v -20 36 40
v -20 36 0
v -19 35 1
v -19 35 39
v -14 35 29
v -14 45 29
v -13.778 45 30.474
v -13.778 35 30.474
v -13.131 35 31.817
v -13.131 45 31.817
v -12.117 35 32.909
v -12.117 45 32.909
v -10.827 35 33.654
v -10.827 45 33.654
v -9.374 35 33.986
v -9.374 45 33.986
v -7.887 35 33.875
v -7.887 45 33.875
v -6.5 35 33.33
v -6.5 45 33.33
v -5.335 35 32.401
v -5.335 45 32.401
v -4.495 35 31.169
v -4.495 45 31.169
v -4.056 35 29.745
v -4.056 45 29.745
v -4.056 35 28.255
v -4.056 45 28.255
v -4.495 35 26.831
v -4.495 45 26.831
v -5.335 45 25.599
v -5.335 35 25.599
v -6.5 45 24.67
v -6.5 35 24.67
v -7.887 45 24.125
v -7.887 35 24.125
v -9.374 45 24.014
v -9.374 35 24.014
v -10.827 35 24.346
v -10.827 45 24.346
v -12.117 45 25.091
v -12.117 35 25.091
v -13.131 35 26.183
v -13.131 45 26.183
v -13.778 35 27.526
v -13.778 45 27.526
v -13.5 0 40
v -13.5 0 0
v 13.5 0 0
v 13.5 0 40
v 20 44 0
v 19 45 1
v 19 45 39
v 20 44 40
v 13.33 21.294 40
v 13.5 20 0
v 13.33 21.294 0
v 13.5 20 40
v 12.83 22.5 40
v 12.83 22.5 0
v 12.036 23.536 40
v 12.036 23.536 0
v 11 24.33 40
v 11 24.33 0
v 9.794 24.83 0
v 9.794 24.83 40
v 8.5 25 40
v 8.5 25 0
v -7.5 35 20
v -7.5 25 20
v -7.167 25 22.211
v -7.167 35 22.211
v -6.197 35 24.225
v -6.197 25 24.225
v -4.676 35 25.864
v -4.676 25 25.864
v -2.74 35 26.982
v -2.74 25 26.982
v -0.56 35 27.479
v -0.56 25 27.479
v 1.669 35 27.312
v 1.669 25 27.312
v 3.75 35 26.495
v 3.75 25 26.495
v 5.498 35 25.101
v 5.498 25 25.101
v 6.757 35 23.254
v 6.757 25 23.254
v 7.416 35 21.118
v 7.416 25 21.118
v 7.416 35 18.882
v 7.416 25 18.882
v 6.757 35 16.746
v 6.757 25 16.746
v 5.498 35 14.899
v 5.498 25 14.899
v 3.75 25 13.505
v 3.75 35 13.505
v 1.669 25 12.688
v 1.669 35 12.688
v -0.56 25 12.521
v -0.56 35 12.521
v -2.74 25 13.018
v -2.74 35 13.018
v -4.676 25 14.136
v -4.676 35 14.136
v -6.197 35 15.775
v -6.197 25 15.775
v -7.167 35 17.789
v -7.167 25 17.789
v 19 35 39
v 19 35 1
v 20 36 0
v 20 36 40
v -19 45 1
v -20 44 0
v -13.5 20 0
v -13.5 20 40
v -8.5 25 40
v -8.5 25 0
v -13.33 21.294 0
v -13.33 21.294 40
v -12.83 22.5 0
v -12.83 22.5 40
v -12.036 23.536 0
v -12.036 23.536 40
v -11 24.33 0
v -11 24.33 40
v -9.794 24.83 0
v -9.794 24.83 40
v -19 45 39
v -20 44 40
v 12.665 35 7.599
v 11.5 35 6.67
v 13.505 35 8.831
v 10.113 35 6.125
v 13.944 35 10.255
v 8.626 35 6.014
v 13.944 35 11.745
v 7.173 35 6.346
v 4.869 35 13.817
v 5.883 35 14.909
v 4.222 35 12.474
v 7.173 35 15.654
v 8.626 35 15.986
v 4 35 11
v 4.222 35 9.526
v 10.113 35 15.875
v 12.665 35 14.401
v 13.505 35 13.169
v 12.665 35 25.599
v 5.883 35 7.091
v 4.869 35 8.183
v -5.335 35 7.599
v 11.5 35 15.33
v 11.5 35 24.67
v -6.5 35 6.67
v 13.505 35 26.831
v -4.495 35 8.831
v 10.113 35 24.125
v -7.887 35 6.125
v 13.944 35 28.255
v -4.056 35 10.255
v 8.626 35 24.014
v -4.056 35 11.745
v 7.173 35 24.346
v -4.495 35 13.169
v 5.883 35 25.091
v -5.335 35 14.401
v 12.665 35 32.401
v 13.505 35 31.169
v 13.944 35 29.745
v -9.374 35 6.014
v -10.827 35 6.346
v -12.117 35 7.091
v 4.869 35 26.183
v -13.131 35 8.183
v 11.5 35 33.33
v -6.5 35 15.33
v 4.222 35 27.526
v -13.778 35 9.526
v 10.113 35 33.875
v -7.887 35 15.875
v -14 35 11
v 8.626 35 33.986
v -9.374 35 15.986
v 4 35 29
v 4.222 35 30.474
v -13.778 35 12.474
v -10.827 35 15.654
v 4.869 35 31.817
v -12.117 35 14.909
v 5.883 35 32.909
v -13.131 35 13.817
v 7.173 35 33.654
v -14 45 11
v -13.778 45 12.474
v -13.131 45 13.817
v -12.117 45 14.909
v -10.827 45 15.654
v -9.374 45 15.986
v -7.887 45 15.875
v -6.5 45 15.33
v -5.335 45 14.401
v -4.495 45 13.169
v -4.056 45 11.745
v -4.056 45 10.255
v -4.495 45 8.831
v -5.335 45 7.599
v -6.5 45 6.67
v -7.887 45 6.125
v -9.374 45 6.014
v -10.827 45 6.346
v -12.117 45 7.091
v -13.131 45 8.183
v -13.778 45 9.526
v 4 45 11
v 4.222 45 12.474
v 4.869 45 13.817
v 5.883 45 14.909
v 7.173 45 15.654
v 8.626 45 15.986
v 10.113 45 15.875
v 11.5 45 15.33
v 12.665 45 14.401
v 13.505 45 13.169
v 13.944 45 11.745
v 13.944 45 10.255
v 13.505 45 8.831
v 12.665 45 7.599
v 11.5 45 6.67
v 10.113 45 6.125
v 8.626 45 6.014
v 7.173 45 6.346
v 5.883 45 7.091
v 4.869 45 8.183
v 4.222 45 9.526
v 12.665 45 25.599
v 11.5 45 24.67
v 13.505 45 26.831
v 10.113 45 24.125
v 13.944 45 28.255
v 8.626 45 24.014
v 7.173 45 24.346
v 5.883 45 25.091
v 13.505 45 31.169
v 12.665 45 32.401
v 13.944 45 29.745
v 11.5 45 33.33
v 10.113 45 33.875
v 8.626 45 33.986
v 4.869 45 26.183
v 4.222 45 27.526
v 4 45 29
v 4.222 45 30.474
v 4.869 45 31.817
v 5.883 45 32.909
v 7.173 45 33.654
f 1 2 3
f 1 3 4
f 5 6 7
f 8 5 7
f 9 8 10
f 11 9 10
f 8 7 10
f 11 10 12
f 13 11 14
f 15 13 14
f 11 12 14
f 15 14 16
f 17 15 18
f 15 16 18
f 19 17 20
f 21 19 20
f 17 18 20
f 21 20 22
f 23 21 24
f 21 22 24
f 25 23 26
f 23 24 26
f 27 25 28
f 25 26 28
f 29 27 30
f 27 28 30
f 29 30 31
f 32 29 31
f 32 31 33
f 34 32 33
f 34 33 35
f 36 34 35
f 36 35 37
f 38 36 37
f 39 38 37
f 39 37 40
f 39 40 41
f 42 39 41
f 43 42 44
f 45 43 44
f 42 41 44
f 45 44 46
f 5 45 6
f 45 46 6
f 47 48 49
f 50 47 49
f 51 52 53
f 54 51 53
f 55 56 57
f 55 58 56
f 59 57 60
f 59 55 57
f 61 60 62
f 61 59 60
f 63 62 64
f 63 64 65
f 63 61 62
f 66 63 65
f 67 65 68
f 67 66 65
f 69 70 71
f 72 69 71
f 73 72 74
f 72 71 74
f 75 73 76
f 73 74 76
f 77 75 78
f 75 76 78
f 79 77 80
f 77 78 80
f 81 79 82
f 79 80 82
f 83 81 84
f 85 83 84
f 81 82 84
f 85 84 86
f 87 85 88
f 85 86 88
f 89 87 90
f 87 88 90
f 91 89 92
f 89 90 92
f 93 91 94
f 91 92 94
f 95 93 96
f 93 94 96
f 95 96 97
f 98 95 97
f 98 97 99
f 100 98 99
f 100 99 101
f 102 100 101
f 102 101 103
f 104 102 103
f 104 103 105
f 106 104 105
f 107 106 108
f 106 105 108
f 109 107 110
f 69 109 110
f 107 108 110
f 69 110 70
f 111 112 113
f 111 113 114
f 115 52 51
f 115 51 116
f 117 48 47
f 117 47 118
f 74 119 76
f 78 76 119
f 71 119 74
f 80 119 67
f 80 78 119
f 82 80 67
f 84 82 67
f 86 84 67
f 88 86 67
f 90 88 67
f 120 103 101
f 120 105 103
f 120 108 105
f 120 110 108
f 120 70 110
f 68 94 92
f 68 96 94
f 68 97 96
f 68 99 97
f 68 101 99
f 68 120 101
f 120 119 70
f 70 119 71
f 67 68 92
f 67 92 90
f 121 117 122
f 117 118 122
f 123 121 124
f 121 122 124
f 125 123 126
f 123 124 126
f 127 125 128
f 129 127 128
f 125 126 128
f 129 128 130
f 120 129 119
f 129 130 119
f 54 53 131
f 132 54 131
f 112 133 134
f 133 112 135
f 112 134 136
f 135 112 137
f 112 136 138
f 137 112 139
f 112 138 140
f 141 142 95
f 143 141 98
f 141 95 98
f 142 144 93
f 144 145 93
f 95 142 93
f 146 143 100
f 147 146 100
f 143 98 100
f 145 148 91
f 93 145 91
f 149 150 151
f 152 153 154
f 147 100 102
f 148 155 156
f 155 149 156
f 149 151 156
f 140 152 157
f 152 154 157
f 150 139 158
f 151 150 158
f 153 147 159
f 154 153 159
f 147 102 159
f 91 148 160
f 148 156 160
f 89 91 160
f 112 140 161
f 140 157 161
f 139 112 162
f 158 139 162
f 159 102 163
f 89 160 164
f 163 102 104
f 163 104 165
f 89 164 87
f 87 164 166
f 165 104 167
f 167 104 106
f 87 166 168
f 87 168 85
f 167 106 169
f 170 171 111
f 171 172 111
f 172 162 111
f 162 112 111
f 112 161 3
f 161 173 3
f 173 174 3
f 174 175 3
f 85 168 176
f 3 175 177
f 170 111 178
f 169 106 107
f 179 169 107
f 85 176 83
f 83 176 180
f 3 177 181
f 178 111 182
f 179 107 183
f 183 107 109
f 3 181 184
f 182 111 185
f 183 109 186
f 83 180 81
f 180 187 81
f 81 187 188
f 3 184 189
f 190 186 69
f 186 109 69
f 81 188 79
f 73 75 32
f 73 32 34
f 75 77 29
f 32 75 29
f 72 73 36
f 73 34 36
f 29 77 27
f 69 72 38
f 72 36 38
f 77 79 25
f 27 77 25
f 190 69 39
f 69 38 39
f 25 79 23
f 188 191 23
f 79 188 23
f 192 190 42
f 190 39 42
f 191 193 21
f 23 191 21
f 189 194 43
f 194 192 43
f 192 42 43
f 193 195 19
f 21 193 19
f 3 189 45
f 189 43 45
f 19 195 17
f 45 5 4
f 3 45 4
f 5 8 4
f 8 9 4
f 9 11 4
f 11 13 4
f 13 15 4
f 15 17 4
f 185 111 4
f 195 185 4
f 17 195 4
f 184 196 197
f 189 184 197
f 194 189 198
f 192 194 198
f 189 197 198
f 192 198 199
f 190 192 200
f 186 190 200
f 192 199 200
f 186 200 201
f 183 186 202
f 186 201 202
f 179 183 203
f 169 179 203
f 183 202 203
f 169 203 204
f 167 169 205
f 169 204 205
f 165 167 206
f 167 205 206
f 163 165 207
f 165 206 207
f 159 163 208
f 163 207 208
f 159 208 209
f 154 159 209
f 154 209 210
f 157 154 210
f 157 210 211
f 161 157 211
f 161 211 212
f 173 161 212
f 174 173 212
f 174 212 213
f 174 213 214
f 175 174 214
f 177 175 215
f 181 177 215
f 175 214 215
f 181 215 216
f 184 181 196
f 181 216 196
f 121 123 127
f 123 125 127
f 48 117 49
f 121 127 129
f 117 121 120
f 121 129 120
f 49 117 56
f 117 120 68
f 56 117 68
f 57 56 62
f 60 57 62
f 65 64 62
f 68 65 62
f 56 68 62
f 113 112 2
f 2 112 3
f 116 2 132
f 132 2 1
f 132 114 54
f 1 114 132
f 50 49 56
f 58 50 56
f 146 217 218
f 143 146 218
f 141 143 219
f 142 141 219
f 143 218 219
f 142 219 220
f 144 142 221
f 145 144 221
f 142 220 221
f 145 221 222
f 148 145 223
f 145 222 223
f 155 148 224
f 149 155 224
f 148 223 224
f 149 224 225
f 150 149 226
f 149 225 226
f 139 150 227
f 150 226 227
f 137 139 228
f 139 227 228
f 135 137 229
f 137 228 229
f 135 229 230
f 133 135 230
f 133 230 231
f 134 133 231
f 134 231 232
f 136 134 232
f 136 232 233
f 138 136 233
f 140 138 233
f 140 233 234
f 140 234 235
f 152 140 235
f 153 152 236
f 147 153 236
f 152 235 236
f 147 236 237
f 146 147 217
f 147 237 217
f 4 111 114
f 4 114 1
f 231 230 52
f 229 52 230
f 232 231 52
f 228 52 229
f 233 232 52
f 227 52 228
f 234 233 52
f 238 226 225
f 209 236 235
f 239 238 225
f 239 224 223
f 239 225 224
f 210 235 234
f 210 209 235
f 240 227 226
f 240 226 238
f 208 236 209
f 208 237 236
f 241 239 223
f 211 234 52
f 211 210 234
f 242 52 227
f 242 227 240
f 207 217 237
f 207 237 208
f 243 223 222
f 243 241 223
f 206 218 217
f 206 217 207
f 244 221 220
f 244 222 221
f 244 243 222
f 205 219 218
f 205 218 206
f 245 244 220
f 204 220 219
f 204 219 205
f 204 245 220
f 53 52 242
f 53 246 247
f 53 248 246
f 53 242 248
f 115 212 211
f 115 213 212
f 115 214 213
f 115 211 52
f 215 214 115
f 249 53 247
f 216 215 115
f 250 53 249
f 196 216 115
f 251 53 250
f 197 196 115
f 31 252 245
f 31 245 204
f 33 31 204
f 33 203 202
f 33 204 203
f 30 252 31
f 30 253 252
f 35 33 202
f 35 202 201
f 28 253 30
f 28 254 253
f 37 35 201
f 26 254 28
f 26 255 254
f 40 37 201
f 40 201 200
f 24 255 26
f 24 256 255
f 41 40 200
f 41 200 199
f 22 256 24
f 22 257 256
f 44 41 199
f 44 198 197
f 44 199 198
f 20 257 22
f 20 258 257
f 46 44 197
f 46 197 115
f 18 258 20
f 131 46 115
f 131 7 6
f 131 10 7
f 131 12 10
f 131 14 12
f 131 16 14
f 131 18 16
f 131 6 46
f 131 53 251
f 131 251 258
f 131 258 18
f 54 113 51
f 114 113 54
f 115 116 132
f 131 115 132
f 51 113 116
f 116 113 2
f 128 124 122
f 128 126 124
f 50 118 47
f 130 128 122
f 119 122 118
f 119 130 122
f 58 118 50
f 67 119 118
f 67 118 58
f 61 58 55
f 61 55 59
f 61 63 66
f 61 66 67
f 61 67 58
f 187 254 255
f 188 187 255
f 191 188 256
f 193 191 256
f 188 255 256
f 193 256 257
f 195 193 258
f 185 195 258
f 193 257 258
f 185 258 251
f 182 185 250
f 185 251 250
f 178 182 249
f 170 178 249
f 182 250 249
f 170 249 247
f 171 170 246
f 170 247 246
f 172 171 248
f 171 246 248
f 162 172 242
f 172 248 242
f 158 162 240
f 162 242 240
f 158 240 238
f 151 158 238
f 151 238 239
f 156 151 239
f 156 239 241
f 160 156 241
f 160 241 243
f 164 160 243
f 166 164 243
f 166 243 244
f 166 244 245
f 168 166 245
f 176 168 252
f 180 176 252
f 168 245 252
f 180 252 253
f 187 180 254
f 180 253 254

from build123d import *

# Parameters (mm, degrees)
F0_W     = 27
F0_H     = 25
F1_DEPTH = 40
F2_R     = 5
F3_R     = 7.5
F4_DEPTH = 10
F5_W     = 40
F5_H     = 40
F6_DEPTH = 10
F7_SIZE  = 1
F8_R     = 5
F9_DEPTH = 10


with BuildPart() as f1:
    # F0 (on Top) → F1 (new body)
    with BuildSketch(Plane.XY):
        with Locations((0, 12.5)):
            Rectangle(F0_W, F0_H)
    extrude(amount=F1_DEPTH)

    # F2
    f2_edges = [f1.edges().sort_by_distance(p)[0] for p in [
        (13.5, 25, 20),
        (-13.5, 25, 20),
    ]]
    fillet(f2_edges, radius=F2_R)

    # F3 (on face) → F4 (join)
    with BuildSketch(Plane(origin=(0, 25, 0), x_dir=(-1, 0, 0), z_dir=(0, 1, 0))):
        with Locations((0, 20)):
            Circle(F3_R)
    extrude(amount=F4_DEPTH)

    # F5 (on face) → F6 (join)
    with BuildSketch(Plane(origin=(0, 35, 0), x_dir=(-1, 0, 0), z_dir=(0, 1, 0))):
        with Locations((0, 20)):
            Rectangle(F5_W, F5_H)
    extrude(amount=F6_DEPTH)

    # F7
    f7_edges = [f1.edges().sort_by_distance(p)[0] for p in [
        (-20, 45, 20),
        (0, 45, 40),
        (20, 45, 20),
        (0, 45, 0),
        (-20, 35, 20),
        (0, 35, 40),
        (0, 35, 0),
        (20, 35, 20),
    ]]
    chamfer(f7_edges, length=F7_SIZE)

    # F8 (on face) → F9 (cut)
    with BuildSketch(Plane(origin=(0, 45, 0), x_dir=(-1, 0, 0), z_dir=(0, 1, 0))):
        with Locations((-9, 29)):
            Circle(F8_R)
        with Locations((9, 29)):
            Circle(F8_R)
        with Locations((-9, 11)):
            Circle(F8_R)
        with Locations((9, 11)):
            Circle(F8_R)
    extrude(amount=-F9_DEPTH, mode=Mode.SUBTRACT)


solid = f1.part
